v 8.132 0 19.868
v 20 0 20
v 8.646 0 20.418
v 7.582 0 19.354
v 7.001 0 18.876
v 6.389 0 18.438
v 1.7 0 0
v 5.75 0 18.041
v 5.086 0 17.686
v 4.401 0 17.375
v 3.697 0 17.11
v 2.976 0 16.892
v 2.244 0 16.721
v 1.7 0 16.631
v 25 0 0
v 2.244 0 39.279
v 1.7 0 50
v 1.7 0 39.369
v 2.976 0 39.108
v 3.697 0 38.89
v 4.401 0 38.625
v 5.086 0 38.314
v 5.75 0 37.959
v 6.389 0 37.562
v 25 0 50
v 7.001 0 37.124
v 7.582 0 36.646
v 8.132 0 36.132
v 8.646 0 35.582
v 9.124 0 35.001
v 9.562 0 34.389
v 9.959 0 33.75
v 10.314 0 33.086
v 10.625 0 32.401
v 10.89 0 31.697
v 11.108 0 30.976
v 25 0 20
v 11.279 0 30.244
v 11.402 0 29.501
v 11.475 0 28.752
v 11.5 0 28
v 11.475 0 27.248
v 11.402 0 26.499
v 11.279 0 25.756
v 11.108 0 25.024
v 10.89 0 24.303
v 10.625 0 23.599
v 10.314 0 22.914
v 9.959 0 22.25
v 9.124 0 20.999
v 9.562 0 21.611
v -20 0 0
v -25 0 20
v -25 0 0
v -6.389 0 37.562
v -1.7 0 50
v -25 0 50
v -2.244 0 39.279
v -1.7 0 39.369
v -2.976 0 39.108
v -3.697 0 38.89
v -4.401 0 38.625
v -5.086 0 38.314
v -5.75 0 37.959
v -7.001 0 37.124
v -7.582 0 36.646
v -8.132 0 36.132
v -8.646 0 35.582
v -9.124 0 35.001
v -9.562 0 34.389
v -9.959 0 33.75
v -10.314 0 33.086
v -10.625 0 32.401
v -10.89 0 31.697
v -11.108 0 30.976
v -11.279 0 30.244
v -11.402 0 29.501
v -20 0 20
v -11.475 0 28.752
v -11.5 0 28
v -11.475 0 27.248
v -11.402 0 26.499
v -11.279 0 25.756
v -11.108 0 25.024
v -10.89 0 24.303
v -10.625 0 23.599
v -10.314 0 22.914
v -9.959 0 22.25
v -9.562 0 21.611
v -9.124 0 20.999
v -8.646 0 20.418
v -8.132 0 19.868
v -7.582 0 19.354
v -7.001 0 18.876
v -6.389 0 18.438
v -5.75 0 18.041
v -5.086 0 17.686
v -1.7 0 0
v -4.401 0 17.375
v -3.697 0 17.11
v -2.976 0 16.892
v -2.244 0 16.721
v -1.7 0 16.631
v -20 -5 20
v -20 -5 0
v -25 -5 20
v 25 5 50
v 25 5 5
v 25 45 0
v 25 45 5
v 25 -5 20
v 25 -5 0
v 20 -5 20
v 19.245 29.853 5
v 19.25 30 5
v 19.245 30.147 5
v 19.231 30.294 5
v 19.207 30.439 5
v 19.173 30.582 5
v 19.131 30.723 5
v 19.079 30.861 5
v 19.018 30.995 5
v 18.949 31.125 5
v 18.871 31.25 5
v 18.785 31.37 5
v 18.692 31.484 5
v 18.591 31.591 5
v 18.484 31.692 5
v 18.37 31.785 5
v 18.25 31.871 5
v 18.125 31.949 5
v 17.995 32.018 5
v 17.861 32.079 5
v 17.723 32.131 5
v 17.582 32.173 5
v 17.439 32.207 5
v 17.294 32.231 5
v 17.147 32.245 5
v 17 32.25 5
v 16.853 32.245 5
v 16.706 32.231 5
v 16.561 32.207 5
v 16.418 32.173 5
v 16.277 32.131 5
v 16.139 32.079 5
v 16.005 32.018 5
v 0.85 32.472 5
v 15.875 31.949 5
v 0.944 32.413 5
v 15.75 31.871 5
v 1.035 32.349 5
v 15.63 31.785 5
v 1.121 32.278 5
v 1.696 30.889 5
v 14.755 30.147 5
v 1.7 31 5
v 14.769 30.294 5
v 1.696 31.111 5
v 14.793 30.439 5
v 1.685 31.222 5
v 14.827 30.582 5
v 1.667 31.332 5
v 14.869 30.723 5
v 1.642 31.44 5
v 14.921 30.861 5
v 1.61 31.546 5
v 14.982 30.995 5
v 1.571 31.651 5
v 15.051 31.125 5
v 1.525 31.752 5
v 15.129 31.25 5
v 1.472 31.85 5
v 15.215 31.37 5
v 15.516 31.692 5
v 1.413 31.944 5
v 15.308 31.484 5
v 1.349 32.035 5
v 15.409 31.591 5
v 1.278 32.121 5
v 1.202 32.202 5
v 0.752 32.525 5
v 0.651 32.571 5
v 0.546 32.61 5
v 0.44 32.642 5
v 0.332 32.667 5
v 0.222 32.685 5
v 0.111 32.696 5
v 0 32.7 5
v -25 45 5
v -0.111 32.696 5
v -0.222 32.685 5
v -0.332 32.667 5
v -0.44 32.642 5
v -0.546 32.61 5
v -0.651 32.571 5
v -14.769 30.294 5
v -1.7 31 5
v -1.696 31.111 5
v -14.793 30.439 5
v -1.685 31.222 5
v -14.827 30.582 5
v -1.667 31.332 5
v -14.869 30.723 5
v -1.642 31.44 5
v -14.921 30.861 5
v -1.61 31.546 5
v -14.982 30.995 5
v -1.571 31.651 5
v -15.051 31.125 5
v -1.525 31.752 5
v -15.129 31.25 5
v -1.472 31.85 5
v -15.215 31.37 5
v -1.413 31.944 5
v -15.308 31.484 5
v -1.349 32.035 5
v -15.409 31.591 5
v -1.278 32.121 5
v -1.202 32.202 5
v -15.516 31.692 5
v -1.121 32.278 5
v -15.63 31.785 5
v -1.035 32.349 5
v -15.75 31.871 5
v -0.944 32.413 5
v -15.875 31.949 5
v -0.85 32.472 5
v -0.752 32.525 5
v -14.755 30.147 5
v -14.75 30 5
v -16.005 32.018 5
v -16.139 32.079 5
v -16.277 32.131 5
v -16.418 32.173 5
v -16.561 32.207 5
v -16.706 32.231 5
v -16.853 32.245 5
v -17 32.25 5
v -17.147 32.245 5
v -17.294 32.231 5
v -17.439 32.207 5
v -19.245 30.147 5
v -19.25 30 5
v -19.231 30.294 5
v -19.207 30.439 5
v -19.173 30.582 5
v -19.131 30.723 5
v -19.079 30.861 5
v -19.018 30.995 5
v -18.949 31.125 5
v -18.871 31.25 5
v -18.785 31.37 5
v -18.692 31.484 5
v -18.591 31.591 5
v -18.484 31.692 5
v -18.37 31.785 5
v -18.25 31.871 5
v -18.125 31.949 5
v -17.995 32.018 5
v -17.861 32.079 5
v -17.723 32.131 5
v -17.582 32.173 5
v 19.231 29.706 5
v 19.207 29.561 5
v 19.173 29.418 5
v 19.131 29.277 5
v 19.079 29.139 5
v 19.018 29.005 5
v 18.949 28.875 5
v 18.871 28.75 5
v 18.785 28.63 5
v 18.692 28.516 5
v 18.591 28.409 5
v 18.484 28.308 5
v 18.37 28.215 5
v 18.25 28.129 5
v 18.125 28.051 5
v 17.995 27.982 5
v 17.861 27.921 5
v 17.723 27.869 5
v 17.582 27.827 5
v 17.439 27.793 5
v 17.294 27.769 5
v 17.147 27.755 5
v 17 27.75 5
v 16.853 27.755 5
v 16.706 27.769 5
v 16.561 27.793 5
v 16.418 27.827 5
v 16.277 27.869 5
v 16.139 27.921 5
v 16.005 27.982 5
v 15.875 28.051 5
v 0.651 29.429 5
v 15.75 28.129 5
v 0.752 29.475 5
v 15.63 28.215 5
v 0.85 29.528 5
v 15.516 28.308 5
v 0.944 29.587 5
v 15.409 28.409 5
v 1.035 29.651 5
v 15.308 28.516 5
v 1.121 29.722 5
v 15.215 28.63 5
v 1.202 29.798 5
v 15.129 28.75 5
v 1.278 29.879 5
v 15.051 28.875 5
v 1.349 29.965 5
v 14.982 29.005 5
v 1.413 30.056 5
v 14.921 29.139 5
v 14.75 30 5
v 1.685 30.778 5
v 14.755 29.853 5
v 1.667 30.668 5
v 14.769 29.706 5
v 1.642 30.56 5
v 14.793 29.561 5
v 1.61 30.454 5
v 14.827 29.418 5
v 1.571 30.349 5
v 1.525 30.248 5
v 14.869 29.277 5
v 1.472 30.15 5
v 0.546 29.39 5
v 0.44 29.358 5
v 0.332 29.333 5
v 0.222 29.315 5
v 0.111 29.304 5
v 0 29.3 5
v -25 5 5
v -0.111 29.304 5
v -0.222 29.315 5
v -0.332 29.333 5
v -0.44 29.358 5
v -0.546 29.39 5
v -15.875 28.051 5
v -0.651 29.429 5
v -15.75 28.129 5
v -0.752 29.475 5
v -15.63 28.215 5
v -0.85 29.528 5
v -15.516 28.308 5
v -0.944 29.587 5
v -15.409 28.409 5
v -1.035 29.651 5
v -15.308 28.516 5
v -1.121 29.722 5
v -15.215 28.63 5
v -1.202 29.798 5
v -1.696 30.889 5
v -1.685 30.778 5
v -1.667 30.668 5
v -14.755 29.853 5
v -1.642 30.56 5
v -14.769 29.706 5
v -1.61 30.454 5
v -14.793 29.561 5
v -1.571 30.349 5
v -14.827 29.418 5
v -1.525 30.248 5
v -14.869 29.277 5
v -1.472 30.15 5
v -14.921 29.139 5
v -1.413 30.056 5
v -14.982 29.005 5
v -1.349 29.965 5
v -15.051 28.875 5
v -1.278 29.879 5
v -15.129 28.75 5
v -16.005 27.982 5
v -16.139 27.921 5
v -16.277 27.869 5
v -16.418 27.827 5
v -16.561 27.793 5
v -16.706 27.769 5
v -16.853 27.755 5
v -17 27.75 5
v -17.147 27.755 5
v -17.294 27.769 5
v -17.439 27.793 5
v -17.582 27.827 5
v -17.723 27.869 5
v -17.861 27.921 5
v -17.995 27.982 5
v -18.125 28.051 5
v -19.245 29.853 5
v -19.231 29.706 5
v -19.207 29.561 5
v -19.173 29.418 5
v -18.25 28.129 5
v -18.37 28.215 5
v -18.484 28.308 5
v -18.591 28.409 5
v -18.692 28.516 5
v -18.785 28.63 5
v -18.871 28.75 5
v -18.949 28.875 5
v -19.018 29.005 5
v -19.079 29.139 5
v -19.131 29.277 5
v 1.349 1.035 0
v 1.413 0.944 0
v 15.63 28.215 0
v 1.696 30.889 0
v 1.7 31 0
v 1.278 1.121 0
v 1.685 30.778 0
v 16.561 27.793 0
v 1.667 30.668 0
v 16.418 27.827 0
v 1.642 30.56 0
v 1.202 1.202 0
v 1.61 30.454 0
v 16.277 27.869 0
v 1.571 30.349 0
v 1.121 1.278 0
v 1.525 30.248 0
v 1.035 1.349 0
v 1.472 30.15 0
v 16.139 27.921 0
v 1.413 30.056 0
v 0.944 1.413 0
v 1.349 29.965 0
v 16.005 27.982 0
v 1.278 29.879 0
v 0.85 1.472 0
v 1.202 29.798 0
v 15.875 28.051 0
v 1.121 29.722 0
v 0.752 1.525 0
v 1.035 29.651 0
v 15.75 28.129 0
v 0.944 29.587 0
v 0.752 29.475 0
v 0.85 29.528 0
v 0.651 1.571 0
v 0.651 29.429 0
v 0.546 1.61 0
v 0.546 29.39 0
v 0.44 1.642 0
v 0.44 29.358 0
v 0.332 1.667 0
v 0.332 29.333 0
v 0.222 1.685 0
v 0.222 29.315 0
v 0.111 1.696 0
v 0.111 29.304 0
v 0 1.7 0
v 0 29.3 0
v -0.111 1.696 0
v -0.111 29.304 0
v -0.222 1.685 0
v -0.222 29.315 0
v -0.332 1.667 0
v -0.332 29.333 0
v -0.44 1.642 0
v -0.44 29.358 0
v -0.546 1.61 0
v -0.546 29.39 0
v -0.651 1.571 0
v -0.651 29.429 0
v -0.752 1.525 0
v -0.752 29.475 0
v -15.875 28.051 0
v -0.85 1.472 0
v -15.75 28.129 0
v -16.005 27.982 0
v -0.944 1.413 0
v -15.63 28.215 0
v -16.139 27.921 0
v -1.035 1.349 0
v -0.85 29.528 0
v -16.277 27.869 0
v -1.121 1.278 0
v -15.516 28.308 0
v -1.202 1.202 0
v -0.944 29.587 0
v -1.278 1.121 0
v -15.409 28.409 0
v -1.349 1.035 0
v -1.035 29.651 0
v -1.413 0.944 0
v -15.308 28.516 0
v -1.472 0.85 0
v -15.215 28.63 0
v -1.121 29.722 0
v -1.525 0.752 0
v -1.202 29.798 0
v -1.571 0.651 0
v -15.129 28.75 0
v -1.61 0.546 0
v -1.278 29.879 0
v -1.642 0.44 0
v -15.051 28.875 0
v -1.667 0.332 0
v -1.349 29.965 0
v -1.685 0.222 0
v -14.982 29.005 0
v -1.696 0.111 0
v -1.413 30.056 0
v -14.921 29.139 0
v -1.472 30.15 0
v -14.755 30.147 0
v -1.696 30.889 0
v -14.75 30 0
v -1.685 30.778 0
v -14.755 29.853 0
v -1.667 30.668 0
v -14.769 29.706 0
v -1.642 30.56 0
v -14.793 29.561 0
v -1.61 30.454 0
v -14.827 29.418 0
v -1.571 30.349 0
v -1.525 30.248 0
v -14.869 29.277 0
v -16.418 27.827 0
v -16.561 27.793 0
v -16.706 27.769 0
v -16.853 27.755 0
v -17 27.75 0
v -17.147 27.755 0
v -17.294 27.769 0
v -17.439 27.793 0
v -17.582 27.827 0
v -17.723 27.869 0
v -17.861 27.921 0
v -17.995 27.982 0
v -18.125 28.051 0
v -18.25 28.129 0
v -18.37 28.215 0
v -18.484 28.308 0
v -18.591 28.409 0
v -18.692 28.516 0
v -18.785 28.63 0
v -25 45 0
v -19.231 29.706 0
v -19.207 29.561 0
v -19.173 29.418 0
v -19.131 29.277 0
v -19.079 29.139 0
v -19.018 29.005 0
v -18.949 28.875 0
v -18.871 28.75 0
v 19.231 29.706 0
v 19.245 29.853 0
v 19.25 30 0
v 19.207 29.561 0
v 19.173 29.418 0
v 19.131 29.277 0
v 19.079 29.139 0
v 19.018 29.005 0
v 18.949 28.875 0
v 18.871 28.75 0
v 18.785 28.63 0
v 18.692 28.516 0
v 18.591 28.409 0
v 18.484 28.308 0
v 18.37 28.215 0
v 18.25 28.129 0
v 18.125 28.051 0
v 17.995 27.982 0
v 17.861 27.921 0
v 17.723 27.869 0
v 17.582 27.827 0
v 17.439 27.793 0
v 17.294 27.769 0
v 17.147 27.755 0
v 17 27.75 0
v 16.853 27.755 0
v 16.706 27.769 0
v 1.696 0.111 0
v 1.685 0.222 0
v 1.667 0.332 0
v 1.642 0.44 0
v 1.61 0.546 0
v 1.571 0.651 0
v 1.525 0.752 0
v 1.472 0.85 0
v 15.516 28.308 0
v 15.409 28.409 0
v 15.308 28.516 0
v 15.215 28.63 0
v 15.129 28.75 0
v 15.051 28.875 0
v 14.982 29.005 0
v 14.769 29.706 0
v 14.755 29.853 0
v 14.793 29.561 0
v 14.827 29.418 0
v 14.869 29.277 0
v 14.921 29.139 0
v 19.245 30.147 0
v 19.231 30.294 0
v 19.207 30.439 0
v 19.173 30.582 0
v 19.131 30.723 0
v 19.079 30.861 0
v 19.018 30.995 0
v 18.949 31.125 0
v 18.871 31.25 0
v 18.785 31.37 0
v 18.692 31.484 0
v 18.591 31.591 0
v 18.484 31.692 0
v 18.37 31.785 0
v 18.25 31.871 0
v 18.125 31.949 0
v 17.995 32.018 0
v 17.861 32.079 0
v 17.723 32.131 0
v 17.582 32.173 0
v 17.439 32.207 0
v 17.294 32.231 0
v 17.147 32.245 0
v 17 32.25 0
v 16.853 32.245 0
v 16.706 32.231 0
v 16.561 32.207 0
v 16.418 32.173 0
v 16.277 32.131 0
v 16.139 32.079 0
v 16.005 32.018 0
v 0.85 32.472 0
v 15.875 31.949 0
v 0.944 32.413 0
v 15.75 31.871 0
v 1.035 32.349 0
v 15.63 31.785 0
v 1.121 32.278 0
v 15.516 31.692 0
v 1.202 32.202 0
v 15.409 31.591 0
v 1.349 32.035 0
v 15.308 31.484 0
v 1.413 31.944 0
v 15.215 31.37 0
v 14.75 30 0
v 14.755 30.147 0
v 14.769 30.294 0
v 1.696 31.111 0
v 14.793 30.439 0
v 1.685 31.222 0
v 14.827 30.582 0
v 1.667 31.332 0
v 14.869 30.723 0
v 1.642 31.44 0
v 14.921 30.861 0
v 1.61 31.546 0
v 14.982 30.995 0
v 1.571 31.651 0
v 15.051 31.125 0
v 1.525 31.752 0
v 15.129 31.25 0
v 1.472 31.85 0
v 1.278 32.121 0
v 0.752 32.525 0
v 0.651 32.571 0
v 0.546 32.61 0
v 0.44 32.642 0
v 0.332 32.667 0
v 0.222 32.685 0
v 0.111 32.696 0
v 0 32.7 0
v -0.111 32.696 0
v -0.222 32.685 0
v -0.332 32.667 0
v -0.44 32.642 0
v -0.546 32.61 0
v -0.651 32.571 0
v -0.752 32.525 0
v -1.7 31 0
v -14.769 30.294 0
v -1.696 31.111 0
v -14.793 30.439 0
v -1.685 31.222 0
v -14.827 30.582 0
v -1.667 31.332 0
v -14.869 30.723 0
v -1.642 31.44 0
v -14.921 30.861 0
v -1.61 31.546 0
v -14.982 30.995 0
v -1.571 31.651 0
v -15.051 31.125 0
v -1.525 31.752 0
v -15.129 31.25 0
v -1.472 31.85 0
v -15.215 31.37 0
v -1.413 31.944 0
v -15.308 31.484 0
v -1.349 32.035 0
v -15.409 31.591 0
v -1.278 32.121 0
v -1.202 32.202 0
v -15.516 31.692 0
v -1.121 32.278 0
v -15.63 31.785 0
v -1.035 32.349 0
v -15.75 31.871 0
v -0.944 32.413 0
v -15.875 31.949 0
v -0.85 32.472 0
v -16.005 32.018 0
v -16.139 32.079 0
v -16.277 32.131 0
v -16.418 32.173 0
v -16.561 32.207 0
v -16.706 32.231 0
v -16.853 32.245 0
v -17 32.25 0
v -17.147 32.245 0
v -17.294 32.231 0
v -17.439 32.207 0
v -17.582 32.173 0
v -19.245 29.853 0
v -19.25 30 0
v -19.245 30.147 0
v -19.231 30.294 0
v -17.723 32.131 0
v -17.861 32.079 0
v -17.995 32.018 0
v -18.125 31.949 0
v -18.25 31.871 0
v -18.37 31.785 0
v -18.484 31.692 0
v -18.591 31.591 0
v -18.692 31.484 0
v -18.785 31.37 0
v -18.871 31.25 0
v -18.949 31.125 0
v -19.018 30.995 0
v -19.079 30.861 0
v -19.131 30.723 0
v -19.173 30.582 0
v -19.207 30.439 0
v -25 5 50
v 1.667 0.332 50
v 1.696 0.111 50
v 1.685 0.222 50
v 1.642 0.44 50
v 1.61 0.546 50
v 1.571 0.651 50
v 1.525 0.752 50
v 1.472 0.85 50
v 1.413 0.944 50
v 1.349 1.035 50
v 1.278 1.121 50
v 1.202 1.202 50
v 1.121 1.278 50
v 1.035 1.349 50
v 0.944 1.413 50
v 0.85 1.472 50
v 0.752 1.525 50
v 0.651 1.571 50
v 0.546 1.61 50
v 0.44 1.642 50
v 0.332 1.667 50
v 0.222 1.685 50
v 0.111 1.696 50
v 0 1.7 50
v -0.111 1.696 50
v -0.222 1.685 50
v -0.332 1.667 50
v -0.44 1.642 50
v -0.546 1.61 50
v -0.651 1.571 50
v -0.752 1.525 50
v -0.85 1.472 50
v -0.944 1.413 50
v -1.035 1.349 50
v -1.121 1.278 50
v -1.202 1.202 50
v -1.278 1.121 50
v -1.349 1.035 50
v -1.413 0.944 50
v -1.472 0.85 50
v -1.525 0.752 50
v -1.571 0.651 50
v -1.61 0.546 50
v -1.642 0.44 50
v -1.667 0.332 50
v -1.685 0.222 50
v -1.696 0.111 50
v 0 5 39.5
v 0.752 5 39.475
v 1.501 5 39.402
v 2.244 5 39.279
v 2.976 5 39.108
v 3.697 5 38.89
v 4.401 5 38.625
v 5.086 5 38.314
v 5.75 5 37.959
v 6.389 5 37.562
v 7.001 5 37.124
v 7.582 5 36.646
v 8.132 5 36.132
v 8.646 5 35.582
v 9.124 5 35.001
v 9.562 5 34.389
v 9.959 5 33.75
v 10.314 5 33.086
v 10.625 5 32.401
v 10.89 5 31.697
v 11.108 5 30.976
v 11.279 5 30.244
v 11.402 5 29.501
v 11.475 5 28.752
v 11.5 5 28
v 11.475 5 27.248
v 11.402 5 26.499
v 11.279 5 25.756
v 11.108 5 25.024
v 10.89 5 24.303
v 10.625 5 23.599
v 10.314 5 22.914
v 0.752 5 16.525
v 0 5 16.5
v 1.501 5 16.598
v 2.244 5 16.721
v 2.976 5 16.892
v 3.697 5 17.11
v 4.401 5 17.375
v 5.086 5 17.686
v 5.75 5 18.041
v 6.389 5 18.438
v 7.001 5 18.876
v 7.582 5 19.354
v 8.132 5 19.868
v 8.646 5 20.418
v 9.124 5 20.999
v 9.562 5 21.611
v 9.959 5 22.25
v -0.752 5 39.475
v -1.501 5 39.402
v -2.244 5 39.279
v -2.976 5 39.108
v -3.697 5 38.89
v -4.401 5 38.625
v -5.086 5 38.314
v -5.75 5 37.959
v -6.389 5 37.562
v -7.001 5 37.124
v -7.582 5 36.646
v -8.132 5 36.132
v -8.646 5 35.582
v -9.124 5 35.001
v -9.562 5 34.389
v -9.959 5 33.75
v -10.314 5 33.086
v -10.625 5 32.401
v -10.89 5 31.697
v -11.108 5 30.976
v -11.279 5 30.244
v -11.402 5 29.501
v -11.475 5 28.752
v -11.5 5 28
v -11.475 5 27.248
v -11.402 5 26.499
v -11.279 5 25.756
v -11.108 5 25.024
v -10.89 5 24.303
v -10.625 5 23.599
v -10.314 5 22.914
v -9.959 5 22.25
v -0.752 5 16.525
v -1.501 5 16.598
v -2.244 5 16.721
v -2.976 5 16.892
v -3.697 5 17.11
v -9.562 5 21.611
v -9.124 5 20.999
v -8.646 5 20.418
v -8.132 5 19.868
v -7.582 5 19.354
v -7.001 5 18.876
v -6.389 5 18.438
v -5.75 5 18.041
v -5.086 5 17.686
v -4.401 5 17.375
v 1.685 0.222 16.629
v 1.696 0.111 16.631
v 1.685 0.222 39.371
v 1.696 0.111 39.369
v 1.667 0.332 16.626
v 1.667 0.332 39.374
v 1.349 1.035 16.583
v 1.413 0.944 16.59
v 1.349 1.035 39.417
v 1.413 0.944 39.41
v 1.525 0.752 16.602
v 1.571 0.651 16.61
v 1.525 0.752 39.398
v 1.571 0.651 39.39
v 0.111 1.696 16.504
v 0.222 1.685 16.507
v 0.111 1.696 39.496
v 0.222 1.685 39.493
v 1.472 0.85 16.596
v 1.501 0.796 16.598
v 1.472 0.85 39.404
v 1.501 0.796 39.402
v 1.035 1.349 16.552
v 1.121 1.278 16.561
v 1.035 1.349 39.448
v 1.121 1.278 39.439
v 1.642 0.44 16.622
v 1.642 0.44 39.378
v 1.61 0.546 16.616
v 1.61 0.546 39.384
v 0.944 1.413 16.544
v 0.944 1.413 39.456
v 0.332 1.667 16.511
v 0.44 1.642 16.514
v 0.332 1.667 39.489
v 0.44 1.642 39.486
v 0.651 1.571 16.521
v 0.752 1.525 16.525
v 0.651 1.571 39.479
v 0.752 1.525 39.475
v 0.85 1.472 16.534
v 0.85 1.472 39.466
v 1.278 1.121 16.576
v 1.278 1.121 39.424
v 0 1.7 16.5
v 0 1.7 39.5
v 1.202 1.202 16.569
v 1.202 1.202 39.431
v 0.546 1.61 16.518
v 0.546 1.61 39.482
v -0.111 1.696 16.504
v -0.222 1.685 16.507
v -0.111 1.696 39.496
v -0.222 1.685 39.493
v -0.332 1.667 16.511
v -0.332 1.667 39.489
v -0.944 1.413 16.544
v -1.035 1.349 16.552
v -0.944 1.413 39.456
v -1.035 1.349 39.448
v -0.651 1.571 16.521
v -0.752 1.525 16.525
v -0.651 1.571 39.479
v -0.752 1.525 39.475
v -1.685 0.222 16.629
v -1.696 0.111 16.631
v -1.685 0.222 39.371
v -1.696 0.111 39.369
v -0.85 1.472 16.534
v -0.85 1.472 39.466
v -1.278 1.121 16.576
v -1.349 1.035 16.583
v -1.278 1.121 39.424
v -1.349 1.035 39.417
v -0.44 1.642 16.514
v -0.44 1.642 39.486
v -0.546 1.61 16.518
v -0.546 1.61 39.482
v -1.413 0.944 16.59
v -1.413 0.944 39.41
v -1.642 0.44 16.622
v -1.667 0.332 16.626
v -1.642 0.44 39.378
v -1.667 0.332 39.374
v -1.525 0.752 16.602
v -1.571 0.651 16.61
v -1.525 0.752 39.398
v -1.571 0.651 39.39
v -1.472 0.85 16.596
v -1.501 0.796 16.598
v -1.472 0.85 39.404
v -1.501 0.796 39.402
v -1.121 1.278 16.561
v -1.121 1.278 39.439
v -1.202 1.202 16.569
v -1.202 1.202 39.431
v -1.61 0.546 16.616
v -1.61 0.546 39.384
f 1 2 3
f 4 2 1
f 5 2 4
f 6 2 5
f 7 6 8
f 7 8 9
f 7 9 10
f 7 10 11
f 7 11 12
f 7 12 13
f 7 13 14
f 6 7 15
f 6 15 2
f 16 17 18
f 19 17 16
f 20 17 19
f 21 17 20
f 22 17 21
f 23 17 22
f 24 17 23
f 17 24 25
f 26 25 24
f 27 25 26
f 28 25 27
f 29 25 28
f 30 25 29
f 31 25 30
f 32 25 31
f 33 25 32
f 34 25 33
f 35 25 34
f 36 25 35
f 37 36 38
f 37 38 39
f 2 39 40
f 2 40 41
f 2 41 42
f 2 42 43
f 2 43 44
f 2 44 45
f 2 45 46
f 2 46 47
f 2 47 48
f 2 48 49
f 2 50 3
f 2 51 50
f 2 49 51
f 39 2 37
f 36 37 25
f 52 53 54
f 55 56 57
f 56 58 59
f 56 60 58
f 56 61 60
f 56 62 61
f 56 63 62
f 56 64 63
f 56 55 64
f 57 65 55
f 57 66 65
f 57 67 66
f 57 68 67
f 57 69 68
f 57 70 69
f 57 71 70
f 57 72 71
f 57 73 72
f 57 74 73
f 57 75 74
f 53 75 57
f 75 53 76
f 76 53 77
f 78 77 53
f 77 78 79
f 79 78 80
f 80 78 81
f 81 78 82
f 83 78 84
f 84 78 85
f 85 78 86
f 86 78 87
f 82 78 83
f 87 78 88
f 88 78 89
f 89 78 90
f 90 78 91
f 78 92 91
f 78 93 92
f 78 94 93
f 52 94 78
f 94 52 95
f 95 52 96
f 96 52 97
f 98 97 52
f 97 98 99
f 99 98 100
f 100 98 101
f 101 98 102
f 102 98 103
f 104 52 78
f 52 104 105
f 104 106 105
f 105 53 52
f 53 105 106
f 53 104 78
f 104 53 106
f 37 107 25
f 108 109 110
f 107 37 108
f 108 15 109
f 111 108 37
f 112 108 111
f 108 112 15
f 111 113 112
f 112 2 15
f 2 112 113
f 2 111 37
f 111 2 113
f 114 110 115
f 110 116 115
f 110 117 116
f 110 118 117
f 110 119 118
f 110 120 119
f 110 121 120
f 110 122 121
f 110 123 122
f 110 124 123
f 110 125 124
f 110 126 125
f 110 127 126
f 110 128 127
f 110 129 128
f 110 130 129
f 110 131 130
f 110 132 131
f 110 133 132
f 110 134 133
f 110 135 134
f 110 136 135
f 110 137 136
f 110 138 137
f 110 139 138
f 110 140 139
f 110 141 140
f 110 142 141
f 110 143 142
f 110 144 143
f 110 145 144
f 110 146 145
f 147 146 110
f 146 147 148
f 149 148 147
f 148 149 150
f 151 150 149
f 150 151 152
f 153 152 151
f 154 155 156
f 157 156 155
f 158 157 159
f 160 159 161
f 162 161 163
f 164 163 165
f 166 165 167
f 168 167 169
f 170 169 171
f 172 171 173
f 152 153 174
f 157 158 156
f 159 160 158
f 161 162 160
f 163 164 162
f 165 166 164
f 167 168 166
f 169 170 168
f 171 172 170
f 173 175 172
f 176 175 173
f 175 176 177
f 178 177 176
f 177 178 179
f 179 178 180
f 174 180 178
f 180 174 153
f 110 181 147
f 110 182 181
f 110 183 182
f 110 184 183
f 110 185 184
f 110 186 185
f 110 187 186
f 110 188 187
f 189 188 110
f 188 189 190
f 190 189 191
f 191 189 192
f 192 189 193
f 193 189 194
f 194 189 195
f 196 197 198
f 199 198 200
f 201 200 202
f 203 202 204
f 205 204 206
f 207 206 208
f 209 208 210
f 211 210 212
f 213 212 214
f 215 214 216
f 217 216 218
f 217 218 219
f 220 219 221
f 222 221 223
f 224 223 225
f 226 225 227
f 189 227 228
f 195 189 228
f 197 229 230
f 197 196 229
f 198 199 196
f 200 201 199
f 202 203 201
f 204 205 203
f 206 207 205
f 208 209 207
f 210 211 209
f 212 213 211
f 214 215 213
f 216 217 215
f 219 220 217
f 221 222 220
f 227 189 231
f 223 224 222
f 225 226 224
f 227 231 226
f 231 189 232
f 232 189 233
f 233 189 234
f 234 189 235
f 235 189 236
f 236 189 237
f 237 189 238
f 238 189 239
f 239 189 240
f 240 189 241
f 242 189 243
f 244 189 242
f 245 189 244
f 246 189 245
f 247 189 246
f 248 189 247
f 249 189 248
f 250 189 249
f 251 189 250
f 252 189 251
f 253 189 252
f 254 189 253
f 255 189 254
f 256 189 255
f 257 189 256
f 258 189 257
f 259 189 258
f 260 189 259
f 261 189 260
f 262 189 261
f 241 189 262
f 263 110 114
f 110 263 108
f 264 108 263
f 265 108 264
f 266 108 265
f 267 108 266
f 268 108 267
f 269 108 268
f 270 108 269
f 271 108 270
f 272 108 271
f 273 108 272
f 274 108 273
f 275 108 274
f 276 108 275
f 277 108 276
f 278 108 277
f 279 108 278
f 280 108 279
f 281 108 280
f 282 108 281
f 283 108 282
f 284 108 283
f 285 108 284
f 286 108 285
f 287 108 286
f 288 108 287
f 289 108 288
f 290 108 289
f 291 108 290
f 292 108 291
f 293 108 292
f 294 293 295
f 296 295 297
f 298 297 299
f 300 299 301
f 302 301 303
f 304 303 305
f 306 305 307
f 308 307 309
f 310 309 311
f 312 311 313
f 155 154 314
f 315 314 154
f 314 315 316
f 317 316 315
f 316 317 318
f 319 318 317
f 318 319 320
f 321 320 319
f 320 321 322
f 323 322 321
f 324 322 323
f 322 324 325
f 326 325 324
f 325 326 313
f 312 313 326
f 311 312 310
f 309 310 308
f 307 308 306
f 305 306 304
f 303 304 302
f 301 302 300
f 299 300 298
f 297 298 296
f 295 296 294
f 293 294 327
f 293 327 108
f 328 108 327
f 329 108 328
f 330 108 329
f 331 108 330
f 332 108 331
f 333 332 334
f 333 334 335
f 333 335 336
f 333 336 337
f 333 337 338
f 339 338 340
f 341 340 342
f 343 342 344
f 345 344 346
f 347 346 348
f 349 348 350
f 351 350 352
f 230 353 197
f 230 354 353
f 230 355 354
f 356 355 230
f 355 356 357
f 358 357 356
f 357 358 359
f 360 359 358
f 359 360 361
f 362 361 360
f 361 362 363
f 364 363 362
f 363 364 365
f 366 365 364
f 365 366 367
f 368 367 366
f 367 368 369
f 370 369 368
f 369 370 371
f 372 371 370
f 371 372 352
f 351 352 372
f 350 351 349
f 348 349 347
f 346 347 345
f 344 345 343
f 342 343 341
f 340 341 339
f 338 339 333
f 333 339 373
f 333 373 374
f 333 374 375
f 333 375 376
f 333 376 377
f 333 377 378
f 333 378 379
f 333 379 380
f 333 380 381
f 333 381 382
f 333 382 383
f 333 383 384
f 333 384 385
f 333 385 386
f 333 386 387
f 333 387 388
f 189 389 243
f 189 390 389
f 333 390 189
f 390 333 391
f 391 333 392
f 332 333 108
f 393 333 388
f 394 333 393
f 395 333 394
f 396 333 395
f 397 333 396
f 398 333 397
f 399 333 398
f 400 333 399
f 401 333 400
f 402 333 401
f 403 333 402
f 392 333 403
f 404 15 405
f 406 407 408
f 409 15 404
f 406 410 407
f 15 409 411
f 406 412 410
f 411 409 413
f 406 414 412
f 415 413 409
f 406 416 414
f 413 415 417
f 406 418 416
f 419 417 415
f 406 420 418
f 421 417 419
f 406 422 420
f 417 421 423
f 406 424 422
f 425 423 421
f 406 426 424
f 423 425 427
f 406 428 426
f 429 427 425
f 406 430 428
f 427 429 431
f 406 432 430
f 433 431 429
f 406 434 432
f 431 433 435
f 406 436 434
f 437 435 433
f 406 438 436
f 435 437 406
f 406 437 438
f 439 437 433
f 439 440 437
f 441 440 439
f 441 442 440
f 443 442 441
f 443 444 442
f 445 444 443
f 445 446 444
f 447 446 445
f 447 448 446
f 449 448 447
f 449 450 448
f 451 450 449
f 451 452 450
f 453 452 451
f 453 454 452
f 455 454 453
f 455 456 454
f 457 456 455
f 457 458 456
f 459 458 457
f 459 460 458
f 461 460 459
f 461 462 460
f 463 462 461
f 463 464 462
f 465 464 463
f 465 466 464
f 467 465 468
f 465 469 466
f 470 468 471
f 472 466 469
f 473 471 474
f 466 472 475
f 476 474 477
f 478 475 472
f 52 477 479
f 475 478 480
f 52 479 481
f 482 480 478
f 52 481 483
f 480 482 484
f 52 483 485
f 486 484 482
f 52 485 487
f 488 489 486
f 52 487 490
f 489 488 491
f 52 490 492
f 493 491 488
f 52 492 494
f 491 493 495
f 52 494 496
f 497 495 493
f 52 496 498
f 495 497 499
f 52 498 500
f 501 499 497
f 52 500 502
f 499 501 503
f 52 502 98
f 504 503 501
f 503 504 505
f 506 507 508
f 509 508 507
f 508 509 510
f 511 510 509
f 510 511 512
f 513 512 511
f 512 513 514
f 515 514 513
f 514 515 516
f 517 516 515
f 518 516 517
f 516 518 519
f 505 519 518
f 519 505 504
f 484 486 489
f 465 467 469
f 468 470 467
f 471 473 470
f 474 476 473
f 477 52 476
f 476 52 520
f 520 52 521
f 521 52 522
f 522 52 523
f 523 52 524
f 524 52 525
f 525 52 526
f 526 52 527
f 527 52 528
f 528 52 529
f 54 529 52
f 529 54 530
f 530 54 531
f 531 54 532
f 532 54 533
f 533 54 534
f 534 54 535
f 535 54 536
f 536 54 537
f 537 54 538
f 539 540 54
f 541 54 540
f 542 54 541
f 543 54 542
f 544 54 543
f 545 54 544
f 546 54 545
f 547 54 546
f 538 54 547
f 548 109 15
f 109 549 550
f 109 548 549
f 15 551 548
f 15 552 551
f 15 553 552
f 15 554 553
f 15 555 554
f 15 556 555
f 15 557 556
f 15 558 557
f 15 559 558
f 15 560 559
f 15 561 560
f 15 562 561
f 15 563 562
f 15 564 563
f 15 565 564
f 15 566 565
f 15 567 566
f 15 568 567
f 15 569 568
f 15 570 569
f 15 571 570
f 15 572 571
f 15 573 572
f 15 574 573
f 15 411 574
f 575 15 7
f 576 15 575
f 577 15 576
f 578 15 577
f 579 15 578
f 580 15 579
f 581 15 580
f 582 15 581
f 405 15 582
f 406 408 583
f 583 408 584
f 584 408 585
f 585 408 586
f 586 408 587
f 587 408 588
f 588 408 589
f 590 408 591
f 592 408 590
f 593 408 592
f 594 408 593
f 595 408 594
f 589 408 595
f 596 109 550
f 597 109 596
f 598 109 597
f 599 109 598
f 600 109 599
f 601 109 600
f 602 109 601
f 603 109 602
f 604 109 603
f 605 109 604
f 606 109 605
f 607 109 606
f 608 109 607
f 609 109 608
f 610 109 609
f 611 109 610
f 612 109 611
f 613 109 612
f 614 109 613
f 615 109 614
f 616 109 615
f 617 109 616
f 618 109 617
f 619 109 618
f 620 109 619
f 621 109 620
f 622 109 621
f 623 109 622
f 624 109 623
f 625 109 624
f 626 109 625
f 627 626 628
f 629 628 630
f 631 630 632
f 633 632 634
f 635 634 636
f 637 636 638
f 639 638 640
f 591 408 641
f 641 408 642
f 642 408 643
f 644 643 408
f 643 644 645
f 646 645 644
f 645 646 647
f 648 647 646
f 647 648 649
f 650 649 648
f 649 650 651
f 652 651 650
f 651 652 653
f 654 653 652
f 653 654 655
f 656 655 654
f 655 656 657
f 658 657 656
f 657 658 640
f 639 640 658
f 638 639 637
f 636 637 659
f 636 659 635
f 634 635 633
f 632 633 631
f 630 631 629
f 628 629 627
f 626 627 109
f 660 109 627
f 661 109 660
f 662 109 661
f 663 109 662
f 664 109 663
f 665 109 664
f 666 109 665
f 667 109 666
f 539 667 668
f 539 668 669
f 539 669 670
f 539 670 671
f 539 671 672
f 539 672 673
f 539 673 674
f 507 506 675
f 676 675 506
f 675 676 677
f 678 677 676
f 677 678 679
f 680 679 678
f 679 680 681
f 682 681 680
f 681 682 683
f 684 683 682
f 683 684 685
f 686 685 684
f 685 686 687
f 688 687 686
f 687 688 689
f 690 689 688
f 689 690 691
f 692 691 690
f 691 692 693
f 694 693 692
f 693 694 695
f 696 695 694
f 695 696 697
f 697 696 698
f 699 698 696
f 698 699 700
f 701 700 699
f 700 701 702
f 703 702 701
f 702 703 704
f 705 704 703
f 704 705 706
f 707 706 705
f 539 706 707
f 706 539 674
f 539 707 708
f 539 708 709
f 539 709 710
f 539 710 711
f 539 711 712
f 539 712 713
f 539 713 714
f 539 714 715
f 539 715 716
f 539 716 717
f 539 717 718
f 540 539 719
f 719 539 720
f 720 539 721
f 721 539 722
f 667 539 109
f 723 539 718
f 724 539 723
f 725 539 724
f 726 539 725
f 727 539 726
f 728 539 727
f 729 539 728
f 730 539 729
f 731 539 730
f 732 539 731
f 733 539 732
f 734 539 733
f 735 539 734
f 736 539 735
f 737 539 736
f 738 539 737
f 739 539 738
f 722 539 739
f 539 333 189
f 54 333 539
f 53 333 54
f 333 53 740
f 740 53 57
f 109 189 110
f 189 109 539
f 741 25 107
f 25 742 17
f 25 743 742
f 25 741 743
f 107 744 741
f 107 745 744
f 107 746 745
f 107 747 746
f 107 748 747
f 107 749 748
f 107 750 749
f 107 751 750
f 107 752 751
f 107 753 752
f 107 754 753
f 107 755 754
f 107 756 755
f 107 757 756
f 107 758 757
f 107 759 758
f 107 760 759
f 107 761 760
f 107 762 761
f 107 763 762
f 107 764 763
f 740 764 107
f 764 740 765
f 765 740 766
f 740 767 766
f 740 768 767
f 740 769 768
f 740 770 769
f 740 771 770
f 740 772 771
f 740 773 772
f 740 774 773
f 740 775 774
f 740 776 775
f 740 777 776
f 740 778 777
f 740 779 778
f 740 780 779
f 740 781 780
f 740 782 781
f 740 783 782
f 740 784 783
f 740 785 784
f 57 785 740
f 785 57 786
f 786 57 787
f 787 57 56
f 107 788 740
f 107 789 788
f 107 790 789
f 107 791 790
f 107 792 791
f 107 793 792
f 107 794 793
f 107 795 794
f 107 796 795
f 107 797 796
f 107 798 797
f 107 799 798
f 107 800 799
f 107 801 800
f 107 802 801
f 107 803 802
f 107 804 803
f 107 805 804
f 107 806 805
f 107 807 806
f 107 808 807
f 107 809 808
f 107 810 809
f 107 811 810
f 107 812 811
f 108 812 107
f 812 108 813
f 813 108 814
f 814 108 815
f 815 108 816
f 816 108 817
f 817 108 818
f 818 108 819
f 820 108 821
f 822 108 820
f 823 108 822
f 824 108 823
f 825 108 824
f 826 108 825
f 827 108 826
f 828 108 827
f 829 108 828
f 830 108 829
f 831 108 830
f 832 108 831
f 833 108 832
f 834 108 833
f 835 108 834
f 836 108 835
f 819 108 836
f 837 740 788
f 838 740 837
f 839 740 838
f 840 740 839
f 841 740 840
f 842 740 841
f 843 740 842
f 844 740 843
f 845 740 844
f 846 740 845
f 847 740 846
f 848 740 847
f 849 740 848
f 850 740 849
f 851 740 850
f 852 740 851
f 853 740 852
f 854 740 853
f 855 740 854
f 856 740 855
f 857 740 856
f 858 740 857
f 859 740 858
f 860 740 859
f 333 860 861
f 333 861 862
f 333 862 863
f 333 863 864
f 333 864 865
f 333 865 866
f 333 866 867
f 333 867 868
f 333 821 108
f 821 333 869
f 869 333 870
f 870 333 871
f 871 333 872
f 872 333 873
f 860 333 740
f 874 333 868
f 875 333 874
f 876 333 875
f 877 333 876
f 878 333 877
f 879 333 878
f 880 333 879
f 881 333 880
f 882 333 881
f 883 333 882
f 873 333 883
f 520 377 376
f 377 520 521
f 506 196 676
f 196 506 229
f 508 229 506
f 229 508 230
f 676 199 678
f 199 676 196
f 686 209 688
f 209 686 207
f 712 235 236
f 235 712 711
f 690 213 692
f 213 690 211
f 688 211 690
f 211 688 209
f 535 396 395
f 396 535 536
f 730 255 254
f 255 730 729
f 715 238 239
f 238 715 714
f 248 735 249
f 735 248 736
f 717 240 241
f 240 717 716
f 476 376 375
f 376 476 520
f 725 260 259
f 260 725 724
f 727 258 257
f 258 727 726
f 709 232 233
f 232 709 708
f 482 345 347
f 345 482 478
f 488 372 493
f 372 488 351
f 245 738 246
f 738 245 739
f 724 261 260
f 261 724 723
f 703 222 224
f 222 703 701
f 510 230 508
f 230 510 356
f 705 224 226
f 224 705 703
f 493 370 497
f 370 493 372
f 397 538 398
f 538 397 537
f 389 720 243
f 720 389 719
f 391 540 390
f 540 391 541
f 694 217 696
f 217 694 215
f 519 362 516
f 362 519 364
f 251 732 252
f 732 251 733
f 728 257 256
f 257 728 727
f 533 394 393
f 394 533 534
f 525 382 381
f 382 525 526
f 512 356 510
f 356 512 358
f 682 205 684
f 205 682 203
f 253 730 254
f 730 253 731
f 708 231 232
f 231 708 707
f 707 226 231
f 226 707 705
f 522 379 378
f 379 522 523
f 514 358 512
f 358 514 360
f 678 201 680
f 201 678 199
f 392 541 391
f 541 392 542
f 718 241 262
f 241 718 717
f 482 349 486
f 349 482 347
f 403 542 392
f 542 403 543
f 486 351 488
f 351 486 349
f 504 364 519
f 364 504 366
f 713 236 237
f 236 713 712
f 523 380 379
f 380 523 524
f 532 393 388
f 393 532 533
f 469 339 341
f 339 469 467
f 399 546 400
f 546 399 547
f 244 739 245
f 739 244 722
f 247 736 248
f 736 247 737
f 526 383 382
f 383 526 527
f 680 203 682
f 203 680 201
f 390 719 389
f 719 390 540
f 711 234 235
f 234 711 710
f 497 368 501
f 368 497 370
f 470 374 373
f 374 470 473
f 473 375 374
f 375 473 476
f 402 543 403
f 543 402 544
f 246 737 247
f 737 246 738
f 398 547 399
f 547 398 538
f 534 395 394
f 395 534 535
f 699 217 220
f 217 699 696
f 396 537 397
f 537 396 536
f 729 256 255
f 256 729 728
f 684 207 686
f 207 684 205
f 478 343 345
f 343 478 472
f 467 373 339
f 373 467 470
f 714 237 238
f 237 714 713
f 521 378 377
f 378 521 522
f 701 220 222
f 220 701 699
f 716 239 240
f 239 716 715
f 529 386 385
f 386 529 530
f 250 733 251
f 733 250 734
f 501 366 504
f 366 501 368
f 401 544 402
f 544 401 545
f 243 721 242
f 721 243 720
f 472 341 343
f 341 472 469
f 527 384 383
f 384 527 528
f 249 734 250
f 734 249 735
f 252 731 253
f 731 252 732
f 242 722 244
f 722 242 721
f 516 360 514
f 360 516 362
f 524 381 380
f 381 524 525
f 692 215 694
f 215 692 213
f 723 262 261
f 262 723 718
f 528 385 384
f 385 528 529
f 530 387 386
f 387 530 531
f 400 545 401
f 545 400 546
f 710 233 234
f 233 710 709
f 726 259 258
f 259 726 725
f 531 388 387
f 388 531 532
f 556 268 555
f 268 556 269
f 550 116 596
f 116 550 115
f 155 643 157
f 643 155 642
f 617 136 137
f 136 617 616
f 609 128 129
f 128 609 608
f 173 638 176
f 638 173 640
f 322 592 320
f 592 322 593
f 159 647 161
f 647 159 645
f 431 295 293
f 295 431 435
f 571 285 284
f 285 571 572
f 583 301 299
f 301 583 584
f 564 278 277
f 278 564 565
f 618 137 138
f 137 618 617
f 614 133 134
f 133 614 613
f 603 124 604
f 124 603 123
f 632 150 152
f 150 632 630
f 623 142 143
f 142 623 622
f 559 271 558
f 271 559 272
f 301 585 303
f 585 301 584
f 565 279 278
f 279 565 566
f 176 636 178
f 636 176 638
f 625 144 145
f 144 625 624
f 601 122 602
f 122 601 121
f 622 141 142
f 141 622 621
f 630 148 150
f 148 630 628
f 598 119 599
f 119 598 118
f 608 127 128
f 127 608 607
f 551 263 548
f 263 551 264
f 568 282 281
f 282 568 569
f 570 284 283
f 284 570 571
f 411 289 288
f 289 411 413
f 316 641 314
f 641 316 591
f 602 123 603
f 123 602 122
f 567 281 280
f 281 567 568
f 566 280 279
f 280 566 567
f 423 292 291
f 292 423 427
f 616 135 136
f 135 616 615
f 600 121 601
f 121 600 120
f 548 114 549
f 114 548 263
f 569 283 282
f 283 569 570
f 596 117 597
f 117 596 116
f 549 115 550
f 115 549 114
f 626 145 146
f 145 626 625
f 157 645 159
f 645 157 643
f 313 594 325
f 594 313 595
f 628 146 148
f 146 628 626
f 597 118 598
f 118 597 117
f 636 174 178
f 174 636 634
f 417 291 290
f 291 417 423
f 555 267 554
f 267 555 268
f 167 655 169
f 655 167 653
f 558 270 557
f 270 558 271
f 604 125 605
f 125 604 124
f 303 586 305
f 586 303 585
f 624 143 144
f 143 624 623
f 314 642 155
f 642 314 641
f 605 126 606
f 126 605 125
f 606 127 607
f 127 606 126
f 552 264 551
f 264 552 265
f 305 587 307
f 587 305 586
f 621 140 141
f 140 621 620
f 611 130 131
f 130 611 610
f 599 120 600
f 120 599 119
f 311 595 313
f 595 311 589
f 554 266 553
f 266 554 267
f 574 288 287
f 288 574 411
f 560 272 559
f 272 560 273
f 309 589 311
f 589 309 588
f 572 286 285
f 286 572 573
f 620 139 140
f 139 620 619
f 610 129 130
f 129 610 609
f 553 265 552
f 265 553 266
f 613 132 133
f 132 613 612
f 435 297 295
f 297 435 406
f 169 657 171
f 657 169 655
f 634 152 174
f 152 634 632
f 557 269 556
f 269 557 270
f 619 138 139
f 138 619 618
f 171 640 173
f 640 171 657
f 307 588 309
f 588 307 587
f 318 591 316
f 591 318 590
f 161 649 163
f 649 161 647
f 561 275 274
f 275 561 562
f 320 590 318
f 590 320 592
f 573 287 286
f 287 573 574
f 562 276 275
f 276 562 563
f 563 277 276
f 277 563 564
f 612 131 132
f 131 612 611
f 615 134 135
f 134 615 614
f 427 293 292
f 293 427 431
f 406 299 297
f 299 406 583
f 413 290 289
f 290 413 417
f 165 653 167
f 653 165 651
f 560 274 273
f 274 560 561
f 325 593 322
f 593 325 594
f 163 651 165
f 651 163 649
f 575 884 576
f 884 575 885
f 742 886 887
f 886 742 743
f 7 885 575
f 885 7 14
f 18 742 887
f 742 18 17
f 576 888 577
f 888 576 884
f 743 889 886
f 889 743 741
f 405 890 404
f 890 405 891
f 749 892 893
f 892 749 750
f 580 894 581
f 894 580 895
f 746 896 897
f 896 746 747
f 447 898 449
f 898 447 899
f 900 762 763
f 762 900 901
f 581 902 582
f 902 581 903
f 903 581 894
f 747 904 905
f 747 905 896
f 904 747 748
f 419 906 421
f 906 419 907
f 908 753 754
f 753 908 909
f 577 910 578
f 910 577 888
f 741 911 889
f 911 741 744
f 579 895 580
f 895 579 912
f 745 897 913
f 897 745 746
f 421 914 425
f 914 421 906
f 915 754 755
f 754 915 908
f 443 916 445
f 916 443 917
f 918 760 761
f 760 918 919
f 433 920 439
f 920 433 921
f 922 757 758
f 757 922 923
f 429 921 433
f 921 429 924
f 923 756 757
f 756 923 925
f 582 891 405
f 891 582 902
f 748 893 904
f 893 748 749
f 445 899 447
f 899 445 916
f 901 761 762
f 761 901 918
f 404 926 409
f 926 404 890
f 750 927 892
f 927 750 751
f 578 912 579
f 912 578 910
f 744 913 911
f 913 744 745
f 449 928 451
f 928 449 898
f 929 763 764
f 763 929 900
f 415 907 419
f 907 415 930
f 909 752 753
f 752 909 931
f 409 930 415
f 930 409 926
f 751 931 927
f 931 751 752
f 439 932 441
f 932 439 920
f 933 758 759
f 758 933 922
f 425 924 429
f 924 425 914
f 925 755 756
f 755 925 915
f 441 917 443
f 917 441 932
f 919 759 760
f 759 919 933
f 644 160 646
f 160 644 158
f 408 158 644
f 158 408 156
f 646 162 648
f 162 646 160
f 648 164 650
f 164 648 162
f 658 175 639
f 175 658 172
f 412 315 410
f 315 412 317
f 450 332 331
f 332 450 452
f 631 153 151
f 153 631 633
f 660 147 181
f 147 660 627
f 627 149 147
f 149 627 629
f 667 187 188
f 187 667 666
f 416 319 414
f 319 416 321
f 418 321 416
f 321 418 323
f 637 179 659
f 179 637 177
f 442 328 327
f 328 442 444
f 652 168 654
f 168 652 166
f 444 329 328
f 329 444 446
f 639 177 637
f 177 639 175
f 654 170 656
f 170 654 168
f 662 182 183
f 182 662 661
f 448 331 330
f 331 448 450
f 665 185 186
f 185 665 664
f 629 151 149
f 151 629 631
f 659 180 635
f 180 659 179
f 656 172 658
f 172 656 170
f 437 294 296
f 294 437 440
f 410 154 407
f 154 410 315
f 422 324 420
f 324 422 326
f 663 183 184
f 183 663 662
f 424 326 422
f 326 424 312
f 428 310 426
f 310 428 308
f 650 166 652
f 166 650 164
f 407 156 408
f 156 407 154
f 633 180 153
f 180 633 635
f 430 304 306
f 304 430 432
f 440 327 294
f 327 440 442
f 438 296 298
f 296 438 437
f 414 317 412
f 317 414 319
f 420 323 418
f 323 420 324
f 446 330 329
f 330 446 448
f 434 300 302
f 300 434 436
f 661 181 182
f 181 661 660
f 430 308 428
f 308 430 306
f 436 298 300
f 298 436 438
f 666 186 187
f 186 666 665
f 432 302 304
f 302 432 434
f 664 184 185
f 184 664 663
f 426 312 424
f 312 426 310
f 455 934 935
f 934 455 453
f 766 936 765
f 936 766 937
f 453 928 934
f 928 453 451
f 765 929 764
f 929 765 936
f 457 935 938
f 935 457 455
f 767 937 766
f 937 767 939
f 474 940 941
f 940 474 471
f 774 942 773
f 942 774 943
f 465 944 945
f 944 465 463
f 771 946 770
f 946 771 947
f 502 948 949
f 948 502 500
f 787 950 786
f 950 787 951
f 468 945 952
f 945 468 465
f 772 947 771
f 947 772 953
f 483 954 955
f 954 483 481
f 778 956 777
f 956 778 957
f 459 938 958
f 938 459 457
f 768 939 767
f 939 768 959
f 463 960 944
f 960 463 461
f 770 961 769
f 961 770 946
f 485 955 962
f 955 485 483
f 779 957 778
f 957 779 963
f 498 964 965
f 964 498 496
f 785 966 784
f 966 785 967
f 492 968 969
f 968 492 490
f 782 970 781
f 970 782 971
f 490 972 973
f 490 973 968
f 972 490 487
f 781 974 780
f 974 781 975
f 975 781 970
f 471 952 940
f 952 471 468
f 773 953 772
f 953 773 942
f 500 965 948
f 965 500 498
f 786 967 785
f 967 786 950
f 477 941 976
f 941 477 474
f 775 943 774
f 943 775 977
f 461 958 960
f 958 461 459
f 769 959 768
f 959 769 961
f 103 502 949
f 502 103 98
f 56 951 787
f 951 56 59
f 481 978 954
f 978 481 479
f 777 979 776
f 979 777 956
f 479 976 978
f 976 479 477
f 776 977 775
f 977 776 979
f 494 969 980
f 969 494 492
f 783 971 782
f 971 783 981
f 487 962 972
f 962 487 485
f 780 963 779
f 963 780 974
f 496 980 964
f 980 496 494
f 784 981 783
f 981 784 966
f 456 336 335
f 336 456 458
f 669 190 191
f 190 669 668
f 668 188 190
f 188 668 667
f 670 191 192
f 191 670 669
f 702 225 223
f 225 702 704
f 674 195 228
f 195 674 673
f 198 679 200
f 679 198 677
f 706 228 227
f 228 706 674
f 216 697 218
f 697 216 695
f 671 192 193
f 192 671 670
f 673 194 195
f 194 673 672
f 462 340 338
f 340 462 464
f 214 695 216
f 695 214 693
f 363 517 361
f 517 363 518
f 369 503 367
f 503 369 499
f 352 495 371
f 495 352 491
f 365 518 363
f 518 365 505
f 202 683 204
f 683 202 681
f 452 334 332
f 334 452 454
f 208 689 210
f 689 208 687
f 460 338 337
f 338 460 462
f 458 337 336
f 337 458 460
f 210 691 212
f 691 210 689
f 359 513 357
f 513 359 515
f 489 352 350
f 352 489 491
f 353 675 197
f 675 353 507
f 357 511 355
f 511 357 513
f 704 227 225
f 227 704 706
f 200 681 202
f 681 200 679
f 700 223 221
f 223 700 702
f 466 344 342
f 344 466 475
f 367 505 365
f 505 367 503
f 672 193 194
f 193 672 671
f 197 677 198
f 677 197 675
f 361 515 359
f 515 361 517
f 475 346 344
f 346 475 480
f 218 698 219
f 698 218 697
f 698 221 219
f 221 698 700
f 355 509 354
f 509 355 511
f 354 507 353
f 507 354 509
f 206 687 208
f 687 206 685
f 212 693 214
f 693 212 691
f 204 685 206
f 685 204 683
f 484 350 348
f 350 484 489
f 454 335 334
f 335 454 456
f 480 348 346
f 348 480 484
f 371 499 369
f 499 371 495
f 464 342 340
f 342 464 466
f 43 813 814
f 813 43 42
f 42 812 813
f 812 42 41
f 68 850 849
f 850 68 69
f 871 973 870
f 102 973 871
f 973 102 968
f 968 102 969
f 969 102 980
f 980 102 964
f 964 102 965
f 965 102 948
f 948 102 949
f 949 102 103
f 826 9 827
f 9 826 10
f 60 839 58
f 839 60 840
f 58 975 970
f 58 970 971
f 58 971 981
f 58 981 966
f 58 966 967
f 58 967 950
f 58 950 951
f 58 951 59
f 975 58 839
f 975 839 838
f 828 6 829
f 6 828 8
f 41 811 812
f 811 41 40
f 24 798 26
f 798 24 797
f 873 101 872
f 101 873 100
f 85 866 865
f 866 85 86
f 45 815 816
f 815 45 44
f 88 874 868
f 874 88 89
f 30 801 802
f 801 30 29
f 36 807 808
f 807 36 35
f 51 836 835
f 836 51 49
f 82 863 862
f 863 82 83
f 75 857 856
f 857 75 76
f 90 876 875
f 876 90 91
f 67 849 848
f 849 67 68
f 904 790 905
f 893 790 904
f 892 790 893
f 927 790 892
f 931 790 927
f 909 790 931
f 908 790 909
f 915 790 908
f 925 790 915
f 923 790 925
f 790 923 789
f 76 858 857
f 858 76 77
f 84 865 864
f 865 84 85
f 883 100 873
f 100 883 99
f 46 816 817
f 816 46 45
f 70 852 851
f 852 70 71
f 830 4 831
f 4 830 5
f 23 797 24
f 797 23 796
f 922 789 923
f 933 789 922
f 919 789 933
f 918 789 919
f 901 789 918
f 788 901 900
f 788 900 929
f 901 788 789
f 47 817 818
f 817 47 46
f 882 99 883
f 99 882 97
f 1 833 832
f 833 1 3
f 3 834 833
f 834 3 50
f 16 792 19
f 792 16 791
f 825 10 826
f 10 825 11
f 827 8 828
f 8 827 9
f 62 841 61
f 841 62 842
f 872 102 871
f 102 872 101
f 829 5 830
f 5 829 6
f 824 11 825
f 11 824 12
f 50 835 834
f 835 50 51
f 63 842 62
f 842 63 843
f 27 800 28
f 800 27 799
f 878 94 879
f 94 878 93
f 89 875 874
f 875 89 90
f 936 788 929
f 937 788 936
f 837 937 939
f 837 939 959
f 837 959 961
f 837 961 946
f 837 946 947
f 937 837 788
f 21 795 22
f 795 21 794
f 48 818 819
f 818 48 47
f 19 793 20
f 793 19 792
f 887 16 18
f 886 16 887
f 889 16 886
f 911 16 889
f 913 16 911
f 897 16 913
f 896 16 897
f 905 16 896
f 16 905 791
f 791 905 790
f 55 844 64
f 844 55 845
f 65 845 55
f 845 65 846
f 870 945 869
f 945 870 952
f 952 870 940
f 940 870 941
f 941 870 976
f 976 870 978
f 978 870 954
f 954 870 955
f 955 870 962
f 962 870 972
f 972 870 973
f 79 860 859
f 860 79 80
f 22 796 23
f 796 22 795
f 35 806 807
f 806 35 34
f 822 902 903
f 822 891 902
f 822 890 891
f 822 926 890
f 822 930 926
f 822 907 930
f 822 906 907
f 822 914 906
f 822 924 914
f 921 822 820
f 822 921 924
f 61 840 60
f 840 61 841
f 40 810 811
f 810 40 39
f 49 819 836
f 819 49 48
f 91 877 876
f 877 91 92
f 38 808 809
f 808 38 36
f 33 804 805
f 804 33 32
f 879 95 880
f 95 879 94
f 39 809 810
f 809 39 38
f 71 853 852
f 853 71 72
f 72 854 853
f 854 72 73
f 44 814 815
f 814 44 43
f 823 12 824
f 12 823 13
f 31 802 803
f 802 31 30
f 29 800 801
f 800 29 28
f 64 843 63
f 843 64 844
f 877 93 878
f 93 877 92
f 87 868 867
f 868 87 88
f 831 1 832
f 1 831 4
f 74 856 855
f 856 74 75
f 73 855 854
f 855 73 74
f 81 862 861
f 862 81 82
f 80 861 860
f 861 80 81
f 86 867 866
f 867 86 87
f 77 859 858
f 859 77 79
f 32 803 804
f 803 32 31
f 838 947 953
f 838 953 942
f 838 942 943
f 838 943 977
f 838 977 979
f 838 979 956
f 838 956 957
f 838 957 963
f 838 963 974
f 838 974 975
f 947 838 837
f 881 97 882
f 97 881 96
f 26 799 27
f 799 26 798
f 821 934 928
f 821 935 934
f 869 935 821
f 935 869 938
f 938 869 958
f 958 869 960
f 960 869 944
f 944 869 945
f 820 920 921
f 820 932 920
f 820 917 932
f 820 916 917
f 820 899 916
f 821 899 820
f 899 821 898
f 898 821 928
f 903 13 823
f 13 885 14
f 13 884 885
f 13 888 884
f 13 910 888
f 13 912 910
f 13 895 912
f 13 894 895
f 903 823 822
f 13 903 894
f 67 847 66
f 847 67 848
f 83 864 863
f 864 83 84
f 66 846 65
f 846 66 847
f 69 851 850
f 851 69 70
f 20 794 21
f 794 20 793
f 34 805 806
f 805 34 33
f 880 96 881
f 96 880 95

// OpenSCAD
// L-shaped mounting bracket for NEMA 17 stepper motor (syringe pump)
// Print orientation: base plate on bed, vertical plate builds upward (+Z)

// ---------------- Parameters ----------------
plate_w      = 50;    // base plate length (X)
plate_h      = 45;    // base plate width (Y)
plate_t      = 5;     // base plate thickness (Z)

hole_x       = 17;    // M4 through-hole X offset (±)
hole_y       = 30;    // M4 through-hole Y position
hole_d       = 4.5;   // M4 through-hole diameter

plate_v_w    = 50;    // vertical motor plate length (X)
plate_v_h    = 5;     // vertical motor plate width (Y)
plate_v_z    = 50;    // vertical motor plate height (Z)

boss_d       = 23;    // motor centring boss hole diameter
boss_x       = 0;     // boss hole X centre
boss_z       = 28;    // boss hole Z centre

screw_d      = 3.4;   // M3 screw hole diameter
screw_pitch  = 31;    // square pattern side length

gusset_t     = 5;     // gusset thickness (X)
gusset_leg   = 20;    // right-triangle leg length (Y and Z)

eps          = 0.5;   // cutter overshoot past faces
$fn          = 96;    // curve resolution

// ---------------- Model ----------------
difference() {
    union() {
        // Base plate
        translate([-plate_w/2, 0, 0])
            cube([plate_w, plate_h, plate_t]);

        // Vertical motor plate (overlaps base plate for a solid union)
        translate([-plate_v_w/2, 0, 0])
            cube([plate_v_w, plate_v_h, plate_v_z]);

        // Gussets: right triangles in YZ, flush with outer X edges
        for (sx = [-1, 1])
            translate([sx > 0 ? plate_v_w/2 - gusset_t : -plate_v_w/2, 0, 0])
                rotate([90, 0, 0])
                    linear_extrude(height = gusset_t)
                        polygon(points = [
                            [gusset_t, gusset_leg],
                            [gusset_t, 0],
                            [0, gusset_leg]
                        ]);
    }

    // M4 through-holes in base plate
    for (ox = [-hole_x, hole_x])
        translate([ox, hole_y, -eps])
            cylinder(d = hole_d, h = plate_t + 2*eps);

    // Motor boss hole through vertical plate (along Y)
    translate([boss_x, -eps, boss_z])
        rotate([-90, 0, 0])
            cylinder(d = boss_d, h = plate_v_h + 2*eps);

    // M3 screw holes on square pattern around boss hole
    for (a = [0, 90, 180, 270])
        rotate([0, 0, a])
            translate([screw_pitch/2, screw_pitch/2, 0])
                for (dx = [-screw_pitch/2, screw_pitch/2])
                    for (dy = [-screw_pitch/2, screw_pitch/2])
                        translate([dx, dy, -eps])
                            cylinder(d = screw_d, h = plate_v_z + 2*eps);
}
